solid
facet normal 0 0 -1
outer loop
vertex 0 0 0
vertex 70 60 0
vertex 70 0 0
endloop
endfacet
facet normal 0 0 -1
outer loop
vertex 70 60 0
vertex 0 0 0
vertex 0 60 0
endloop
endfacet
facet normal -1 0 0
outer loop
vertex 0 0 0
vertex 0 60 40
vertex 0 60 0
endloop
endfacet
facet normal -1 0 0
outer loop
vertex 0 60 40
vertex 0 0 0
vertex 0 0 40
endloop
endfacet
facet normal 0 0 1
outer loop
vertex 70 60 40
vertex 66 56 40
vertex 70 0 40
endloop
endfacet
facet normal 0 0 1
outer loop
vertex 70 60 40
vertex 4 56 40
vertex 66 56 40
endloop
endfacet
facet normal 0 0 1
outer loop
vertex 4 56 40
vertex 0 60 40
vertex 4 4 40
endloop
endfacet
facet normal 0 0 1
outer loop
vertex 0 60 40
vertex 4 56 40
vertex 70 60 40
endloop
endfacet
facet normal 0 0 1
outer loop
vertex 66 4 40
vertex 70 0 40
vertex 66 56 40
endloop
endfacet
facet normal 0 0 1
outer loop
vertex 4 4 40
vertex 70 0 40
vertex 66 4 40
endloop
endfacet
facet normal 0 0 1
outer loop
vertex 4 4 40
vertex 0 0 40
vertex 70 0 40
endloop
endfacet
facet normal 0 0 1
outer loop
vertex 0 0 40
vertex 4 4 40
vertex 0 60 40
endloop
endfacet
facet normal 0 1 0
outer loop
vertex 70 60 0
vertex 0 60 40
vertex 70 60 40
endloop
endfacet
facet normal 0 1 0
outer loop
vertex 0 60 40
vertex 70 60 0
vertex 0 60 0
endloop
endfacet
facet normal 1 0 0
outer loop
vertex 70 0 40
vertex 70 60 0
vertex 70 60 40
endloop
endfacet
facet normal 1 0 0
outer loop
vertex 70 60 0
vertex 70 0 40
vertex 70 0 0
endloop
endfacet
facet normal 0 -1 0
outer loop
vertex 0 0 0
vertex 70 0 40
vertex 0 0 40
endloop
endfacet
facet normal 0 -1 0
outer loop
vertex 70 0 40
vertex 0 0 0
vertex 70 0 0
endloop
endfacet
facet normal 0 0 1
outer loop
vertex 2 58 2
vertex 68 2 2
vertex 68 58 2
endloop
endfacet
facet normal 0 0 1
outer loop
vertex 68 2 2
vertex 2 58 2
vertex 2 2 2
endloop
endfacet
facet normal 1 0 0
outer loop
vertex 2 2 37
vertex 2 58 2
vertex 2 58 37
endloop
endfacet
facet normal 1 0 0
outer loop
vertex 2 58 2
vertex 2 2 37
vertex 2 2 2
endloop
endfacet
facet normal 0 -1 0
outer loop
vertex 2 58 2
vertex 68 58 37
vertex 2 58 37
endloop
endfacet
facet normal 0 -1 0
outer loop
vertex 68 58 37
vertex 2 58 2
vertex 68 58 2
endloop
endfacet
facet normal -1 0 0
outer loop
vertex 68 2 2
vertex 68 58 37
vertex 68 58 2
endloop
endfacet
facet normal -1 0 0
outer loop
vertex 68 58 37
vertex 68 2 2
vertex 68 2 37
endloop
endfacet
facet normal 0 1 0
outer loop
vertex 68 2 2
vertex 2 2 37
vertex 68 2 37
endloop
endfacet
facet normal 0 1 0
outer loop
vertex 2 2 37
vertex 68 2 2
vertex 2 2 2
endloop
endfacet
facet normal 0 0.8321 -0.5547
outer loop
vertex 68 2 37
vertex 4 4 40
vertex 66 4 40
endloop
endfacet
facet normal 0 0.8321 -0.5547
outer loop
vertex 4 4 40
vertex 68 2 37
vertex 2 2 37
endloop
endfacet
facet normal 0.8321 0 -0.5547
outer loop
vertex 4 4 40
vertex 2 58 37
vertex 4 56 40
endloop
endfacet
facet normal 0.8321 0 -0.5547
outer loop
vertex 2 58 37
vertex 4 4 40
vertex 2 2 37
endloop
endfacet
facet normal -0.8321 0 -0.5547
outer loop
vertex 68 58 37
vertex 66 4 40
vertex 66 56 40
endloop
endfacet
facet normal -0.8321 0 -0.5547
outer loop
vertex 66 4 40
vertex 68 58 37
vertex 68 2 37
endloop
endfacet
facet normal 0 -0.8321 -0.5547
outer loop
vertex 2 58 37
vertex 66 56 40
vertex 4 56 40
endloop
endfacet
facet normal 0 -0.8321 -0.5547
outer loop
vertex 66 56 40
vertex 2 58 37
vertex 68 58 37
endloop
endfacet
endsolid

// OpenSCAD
// variables
box_size = [70,60,40];




receiver_box();


module receiver_box() {
    
    difference() {
        linear_extrude(box_size[2]) square([box_size[0],box_size[1]]);
        translate([2,2,2]) linear_extrude(box_size[2]) square([box_size[0],box_size[1]]-[4,4]);
    }
    
    translate([0,0,box_size[2]]) rotate([0,90,0]) linear_extrude(box_size[0]) sealing_profile();
    translate([0,box_size[1],box_size[2]]) rotate([0,90,-90]) linear_extrude(box_size[1]) sealing_profile();
    translate([box_size[0],0,box_size[2]]) rotate([0,90,90]) linear_extrude(box_size[1]) sealing_profile();
    translate([box_size[0],box_size[1],box_size[2]]) rotate([0,90,180]) linear_extrude(box_size[0]) sealing_profile();
}


module sealing_profile() {
    
    polygon([[0,0], [6,0],[0,4]]);
    
}
